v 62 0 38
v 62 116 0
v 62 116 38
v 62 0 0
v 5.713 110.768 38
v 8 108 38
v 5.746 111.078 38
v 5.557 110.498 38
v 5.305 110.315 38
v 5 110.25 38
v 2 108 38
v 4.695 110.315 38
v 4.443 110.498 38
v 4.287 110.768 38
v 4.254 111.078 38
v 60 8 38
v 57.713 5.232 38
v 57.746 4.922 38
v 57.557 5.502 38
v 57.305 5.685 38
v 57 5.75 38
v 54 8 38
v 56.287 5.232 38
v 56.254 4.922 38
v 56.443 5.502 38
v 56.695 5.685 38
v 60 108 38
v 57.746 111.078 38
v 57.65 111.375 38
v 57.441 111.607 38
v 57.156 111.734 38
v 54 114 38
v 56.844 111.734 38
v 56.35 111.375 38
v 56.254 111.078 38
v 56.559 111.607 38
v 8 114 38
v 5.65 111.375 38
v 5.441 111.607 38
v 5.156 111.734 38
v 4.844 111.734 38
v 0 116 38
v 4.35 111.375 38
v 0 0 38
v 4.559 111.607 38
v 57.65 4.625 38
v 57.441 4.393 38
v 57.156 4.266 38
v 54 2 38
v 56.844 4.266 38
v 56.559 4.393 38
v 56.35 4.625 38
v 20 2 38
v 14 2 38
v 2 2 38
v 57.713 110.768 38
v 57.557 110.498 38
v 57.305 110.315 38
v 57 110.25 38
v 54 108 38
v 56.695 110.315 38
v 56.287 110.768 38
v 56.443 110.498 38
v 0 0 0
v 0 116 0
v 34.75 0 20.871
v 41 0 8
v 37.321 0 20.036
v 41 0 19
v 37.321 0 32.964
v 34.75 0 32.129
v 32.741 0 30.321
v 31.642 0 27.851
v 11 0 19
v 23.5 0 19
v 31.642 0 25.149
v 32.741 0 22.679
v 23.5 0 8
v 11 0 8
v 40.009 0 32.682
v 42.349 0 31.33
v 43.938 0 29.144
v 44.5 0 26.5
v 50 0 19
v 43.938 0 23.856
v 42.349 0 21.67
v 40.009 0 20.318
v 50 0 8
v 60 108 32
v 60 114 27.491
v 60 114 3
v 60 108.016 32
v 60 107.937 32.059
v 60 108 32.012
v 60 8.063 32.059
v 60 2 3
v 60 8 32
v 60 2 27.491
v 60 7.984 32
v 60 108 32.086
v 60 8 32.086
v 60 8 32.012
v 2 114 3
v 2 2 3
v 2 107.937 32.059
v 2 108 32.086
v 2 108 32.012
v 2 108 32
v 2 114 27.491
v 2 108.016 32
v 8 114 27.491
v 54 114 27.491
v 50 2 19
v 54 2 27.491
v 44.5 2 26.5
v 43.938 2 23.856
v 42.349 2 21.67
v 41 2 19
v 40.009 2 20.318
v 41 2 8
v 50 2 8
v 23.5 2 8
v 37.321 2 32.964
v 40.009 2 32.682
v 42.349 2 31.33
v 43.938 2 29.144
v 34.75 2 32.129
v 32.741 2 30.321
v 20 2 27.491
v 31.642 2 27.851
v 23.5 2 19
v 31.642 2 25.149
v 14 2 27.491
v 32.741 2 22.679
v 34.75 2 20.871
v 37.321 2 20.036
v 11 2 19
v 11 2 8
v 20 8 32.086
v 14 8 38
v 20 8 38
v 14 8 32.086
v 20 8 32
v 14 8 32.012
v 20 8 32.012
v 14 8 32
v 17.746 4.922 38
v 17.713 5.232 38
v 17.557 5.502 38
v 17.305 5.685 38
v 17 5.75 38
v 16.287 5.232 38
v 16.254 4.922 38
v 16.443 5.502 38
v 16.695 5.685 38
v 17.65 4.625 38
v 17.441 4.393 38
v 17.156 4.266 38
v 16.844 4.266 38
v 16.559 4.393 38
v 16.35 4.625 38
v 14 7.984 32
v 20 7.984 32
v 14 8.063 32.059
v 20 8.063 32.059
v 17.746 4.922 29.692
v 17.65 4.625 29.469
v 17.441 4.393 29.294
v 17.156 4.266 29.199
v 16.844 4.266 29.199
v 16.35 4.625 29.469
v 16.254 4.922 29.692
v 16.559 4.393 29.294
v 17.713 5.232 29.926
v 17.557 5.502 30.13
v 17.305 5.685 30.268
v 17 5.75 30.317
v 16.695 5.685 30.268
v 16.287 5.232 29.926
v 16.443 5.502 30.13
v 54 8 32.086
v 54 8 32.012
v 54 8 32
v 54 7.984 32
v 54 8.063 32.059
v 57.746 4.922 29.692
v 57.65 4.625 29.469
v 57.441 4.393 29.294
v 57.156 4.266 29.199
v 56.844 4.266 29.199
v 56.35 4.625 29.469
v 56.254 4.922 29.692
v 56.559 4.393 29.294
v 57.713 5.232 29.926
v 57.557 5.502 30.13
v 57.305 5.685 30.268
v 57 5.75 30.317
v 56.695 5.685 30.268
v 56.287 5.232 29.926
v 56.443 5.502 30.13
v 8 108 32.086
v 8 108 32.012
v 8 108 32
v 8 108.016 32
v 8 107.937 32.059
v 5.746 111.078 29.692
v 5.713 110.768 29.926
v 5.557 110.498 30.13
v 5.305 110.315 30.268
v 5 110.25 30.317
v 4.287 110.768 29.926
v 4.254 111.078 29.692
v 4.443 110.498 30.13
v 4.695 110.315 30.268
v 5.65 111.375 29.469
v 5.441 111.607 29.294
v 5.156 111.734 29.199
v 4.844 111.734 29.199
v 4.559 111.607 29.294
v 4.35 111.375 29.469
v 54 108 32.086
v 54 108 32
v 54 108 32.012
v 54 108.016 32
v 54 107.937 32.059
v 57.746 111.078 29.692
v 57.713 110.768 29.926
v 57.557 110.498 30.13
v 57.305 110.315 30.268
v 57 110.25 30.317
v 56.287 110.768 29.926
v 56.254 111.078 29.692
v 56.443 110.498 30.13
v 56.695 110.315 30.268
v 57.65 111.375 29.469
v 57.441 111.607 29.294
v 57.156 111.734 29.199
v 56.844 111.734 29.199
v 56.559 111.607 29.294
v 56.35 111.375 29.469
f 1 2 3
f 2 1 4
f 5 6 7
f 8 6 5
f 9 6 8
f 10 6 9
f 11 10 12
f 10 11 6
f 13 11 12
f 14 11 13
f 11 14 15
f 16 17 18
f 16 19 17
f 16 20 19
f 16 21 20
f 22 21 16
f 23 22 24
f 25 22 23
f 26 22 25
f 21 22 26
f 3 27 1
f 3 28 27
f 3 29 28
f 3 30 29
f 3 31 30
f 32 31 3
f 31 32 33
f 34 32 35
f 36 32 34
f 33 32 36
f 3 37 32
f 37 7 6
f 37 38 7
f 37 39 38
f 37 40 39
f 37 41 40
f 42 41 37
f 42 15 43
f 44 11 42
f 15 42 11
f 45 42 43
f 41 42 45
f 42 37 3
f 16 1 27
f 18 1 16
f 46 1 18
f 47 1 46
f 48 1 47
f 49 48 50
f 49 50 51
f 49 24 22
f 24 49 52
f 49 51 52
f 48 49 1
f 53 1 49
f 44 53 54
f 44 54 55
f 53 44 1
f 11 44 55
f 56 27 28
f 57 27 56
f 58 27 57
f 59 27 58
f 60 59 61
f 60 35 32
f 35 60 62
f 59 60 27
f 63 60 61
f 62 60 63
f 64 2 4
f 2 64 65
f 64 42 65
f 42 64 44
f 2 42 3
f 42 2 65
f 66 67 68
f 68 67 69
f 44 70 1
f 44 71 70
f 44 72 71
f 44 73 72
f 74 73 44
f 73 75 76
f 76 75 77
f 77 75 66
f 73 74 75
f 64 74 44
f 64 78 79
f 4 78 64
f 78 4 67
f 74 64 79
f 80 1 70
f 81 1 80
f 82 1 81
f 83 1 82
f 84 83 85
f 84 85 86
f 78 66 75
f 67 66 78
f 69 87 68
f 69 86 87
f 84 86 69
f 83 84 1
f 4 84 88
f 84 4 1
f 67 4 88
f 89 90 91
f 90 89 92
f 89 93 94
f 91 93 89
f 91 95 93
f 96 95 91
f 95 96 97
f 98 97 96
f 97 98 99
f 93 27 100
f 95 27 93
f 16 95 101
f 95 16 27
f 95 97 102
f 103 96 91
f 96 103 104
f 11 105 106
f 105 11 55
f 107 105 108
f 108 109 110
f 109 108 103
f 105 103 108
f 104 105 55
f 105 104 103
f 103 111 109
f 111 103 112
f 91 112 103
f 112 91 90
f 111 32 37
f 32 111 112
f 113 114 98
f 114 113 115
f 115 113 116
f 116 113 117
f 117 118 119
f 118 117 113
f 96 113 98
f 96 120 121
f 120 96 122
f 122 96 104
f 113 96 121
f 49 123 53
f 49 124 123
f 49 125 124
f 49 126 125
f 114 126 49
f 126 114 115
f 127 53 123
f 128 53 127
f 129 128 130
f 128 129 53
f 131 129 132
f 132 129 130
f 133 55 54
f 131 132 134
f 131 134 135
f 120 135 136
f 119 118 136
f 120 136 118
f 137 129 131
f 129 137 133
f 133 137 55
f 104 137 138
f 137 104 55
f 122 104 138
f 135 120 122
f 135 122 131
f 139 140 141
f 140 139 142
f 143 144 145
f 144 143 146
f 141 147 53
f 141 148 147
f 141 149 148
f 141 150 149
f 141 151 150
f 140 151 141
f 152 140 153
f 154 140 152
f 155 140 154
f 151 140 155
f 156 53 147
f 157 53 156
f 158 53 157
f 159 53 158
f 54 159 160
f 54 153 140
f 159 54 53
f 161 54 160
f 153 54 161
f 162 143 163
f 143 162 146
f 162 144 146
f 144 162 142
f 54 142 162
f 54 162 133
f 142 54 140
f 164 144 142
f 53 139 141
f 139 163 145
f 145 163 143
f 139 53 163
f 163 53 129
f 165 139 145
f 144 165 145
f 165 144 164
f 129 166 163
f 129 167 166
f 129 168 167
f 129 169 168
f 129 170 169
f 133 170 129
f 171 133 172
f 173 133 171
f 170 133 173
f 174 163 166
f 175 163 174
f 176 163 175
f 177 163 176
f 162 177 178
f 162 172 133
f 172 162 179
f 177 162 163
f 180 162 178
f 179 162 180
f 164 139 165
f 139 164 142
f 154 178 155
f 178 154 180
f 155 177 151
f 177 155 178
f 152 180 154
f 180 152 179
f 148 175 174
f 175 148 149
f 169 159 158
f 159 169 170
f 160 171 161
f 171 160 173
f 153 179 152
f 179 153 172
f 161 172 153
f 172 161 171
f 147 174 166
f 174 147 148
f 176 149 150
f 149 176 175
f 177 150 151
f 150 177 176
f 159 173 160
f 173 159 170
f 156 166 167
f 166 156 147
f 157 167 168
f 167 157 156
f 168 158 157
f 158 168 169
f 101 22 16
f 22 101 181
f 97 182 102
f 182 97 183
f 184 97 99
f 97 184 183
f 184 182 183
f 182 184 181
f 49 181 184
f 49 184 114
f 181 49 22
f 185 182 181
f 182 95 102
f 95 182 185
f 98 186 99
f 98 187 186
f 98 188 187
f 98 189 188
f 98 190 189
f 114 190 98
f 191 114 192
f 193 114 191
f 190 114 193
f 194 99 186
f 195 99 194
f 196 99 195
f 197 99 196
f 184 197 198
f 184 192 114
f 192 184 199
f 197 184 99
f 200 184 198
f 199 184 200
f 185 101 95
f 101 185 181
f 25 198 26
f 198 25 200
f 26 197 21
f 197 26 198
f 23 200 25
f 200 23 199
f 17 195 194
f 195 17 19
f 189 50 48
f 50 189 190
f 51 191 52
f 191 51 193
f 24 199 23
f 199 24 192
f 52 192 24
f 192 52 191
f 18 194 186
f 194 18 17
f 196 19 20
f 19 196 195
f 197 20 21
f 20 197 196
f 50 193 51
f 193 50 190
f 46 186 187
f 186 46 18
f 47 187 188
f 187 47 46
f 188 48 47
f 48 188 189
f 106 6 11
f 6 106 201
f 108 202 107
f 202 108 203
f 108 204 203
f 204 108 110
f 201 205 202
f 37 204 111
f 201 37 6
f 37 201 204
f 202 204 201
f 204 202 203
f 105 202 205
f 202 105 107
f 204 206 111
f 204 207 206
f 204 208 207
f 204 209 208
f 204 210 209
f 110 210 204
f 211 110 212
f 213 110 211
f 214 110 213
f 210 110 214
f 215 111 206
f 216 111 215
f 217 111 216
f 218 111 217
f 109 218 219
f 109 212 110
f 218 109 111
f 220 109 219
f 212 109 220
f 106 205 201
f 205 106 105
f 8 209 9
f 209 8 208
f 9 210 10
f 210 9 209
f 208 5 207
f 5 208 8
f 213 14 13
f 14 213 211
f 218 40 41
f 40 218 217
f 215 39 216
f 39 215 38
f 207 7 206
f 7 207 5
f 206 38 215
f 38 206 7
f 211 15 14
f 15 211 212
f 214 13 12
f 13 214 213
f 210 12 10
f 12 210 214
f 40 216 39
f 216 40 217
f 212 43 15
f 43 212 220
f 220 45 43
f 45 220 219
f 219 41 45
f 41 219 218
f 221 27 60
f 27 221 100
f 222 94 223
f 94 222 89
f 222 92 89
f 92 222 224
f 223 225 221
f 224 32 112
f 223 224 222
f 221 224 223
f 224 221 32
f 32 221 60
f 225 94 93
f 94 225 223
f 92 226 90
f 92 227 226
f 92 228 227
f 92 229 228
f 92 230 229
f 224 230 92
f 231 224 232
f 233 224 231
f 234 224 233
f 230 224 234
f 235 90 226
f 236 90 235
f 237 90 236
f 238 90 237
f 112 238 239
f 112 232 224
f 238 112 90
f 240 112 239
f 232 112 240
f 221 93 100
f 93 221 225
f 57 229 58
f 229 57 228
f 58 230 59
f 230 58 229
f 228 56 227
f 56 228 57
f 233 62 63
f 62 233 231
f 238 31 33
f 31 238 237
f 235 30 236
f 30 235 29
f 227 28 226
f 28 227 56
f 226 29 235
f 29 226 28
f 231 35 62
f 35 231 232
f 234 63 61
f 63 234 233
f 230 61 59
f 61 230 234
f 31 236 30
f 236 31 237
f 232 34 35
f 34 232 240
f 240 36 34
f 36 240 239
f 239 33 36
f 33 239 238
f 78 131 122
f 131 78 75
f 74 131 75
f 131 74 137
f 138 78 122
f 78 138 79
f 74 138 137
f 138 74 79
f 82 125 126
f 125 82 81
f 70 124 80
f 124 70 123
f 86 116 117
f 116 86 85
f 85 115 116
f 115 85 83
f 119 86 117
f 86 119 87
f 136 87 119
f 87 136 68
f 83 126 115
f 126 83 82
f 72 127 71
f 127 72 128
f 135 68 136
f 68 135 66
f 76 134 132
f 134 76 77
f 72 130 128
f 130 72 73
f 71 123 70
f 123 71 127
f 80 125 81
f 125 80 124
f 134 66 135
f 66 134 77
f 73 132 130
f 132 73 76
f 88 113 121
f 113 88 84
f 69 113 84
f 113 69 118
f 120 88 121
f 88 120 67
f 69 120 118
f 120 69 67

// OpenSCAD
// file: Arduino_case_values.scad
ven_delka = 116;
ven_sirka = 62;
ven_vyska = 38;

vnit_delka = 112;
vnit_sirka = 58;
vnit_vyska = 35;

usb_sirka = 12.5;
usb_vyska = 11; 
vzdal_usb_z = (ven_vyska - vnit_vyska) + 5; 
vzdal_usb_x = (ven_sirka - vnit_sirka) / 2 + 9;

napajeni_sirka = 9;
napajeni_vyska = usb_vyska;
vzdal_napajeni_z = vzdal_usb_z;
vzdal_napajeni_x = (ven_sirka - vnit_sirka) / 2 + 39;

antena_prumer = 13;
vzdal_antena_x = 38;
vzdal_antena_z = (ven_vyska - vnit_vyska) / 2 + 25; 

rozek_rozm = 6;
rozek_dira = 1.5;

nastavec_prumer = 5;
nastavec_vyska = 3.5;
nastavec_prumer_dira = 1.5;

kryt_vyska = 2;
vyska_pisma = 2;
// main file
include<Arduino_case_values.scad>

$fn = 15;

module rozek()
{
    difference()
    {
        union()
        {
            cube([rozek_rozm, rozek_rozm, rozek_rozm]);
            translate([1.1, rozek_rozm, -0.55]) rotate([90, -7, 0]) cylinder(d = 10, h = rozek_rozm, $fn=3);
        }
        color("red") translate([-5, 0, -5.2]) cube([5, rozek_rozm, 12.3]);
        translate([3, 3, -3]) cylinder(d = 1.5, h = 12);
    }
}

module obal()
{
    difference()
    {
        cube([ven_sirka, ven_delka, ven_vyska]);
        translate ([(ven_sirka - vnit_sirka) / 2, (ven_delka - vnit_delka) / 2, ven_vyska - vnit_vyska]) cube([vnit_sirka, vnit_delka, vnit_vyska]);
    }
    translate([20, 2, 32]) rotate([0, 0, 90]) rozek();
    translate([60, 2, 32]) rotate([0, 0, 90]) rozek();
    translate([2, 114, 32]) rotate([0, 0, 270]) rozek();
    translate([54, 114, 32]) rotate([0, 0, 270]) rozek();
}


module otvory()
{
    translate([vzdal_usb_x, 0, vzdal_usb_z]) cube([usb_sirka, (ven_delka - vnit_delka) / 2, usb_vyska]);
    rotate([270, 0, 0]) translate([vzdal_antena_x, -vzdal_antena_z, 0]) cylinder(d = antena_prumer, h = (ven_delka - vnit_delka) / 2);
    translate([vzdal_napajeni_x, 0, vzdal_napajeni_z]) cube([napajeni_sirka, (ven_delka - vnit_delka) / 2, napajeni_vyska]);
}


difference()
{
    obal();
    otvory();
}
